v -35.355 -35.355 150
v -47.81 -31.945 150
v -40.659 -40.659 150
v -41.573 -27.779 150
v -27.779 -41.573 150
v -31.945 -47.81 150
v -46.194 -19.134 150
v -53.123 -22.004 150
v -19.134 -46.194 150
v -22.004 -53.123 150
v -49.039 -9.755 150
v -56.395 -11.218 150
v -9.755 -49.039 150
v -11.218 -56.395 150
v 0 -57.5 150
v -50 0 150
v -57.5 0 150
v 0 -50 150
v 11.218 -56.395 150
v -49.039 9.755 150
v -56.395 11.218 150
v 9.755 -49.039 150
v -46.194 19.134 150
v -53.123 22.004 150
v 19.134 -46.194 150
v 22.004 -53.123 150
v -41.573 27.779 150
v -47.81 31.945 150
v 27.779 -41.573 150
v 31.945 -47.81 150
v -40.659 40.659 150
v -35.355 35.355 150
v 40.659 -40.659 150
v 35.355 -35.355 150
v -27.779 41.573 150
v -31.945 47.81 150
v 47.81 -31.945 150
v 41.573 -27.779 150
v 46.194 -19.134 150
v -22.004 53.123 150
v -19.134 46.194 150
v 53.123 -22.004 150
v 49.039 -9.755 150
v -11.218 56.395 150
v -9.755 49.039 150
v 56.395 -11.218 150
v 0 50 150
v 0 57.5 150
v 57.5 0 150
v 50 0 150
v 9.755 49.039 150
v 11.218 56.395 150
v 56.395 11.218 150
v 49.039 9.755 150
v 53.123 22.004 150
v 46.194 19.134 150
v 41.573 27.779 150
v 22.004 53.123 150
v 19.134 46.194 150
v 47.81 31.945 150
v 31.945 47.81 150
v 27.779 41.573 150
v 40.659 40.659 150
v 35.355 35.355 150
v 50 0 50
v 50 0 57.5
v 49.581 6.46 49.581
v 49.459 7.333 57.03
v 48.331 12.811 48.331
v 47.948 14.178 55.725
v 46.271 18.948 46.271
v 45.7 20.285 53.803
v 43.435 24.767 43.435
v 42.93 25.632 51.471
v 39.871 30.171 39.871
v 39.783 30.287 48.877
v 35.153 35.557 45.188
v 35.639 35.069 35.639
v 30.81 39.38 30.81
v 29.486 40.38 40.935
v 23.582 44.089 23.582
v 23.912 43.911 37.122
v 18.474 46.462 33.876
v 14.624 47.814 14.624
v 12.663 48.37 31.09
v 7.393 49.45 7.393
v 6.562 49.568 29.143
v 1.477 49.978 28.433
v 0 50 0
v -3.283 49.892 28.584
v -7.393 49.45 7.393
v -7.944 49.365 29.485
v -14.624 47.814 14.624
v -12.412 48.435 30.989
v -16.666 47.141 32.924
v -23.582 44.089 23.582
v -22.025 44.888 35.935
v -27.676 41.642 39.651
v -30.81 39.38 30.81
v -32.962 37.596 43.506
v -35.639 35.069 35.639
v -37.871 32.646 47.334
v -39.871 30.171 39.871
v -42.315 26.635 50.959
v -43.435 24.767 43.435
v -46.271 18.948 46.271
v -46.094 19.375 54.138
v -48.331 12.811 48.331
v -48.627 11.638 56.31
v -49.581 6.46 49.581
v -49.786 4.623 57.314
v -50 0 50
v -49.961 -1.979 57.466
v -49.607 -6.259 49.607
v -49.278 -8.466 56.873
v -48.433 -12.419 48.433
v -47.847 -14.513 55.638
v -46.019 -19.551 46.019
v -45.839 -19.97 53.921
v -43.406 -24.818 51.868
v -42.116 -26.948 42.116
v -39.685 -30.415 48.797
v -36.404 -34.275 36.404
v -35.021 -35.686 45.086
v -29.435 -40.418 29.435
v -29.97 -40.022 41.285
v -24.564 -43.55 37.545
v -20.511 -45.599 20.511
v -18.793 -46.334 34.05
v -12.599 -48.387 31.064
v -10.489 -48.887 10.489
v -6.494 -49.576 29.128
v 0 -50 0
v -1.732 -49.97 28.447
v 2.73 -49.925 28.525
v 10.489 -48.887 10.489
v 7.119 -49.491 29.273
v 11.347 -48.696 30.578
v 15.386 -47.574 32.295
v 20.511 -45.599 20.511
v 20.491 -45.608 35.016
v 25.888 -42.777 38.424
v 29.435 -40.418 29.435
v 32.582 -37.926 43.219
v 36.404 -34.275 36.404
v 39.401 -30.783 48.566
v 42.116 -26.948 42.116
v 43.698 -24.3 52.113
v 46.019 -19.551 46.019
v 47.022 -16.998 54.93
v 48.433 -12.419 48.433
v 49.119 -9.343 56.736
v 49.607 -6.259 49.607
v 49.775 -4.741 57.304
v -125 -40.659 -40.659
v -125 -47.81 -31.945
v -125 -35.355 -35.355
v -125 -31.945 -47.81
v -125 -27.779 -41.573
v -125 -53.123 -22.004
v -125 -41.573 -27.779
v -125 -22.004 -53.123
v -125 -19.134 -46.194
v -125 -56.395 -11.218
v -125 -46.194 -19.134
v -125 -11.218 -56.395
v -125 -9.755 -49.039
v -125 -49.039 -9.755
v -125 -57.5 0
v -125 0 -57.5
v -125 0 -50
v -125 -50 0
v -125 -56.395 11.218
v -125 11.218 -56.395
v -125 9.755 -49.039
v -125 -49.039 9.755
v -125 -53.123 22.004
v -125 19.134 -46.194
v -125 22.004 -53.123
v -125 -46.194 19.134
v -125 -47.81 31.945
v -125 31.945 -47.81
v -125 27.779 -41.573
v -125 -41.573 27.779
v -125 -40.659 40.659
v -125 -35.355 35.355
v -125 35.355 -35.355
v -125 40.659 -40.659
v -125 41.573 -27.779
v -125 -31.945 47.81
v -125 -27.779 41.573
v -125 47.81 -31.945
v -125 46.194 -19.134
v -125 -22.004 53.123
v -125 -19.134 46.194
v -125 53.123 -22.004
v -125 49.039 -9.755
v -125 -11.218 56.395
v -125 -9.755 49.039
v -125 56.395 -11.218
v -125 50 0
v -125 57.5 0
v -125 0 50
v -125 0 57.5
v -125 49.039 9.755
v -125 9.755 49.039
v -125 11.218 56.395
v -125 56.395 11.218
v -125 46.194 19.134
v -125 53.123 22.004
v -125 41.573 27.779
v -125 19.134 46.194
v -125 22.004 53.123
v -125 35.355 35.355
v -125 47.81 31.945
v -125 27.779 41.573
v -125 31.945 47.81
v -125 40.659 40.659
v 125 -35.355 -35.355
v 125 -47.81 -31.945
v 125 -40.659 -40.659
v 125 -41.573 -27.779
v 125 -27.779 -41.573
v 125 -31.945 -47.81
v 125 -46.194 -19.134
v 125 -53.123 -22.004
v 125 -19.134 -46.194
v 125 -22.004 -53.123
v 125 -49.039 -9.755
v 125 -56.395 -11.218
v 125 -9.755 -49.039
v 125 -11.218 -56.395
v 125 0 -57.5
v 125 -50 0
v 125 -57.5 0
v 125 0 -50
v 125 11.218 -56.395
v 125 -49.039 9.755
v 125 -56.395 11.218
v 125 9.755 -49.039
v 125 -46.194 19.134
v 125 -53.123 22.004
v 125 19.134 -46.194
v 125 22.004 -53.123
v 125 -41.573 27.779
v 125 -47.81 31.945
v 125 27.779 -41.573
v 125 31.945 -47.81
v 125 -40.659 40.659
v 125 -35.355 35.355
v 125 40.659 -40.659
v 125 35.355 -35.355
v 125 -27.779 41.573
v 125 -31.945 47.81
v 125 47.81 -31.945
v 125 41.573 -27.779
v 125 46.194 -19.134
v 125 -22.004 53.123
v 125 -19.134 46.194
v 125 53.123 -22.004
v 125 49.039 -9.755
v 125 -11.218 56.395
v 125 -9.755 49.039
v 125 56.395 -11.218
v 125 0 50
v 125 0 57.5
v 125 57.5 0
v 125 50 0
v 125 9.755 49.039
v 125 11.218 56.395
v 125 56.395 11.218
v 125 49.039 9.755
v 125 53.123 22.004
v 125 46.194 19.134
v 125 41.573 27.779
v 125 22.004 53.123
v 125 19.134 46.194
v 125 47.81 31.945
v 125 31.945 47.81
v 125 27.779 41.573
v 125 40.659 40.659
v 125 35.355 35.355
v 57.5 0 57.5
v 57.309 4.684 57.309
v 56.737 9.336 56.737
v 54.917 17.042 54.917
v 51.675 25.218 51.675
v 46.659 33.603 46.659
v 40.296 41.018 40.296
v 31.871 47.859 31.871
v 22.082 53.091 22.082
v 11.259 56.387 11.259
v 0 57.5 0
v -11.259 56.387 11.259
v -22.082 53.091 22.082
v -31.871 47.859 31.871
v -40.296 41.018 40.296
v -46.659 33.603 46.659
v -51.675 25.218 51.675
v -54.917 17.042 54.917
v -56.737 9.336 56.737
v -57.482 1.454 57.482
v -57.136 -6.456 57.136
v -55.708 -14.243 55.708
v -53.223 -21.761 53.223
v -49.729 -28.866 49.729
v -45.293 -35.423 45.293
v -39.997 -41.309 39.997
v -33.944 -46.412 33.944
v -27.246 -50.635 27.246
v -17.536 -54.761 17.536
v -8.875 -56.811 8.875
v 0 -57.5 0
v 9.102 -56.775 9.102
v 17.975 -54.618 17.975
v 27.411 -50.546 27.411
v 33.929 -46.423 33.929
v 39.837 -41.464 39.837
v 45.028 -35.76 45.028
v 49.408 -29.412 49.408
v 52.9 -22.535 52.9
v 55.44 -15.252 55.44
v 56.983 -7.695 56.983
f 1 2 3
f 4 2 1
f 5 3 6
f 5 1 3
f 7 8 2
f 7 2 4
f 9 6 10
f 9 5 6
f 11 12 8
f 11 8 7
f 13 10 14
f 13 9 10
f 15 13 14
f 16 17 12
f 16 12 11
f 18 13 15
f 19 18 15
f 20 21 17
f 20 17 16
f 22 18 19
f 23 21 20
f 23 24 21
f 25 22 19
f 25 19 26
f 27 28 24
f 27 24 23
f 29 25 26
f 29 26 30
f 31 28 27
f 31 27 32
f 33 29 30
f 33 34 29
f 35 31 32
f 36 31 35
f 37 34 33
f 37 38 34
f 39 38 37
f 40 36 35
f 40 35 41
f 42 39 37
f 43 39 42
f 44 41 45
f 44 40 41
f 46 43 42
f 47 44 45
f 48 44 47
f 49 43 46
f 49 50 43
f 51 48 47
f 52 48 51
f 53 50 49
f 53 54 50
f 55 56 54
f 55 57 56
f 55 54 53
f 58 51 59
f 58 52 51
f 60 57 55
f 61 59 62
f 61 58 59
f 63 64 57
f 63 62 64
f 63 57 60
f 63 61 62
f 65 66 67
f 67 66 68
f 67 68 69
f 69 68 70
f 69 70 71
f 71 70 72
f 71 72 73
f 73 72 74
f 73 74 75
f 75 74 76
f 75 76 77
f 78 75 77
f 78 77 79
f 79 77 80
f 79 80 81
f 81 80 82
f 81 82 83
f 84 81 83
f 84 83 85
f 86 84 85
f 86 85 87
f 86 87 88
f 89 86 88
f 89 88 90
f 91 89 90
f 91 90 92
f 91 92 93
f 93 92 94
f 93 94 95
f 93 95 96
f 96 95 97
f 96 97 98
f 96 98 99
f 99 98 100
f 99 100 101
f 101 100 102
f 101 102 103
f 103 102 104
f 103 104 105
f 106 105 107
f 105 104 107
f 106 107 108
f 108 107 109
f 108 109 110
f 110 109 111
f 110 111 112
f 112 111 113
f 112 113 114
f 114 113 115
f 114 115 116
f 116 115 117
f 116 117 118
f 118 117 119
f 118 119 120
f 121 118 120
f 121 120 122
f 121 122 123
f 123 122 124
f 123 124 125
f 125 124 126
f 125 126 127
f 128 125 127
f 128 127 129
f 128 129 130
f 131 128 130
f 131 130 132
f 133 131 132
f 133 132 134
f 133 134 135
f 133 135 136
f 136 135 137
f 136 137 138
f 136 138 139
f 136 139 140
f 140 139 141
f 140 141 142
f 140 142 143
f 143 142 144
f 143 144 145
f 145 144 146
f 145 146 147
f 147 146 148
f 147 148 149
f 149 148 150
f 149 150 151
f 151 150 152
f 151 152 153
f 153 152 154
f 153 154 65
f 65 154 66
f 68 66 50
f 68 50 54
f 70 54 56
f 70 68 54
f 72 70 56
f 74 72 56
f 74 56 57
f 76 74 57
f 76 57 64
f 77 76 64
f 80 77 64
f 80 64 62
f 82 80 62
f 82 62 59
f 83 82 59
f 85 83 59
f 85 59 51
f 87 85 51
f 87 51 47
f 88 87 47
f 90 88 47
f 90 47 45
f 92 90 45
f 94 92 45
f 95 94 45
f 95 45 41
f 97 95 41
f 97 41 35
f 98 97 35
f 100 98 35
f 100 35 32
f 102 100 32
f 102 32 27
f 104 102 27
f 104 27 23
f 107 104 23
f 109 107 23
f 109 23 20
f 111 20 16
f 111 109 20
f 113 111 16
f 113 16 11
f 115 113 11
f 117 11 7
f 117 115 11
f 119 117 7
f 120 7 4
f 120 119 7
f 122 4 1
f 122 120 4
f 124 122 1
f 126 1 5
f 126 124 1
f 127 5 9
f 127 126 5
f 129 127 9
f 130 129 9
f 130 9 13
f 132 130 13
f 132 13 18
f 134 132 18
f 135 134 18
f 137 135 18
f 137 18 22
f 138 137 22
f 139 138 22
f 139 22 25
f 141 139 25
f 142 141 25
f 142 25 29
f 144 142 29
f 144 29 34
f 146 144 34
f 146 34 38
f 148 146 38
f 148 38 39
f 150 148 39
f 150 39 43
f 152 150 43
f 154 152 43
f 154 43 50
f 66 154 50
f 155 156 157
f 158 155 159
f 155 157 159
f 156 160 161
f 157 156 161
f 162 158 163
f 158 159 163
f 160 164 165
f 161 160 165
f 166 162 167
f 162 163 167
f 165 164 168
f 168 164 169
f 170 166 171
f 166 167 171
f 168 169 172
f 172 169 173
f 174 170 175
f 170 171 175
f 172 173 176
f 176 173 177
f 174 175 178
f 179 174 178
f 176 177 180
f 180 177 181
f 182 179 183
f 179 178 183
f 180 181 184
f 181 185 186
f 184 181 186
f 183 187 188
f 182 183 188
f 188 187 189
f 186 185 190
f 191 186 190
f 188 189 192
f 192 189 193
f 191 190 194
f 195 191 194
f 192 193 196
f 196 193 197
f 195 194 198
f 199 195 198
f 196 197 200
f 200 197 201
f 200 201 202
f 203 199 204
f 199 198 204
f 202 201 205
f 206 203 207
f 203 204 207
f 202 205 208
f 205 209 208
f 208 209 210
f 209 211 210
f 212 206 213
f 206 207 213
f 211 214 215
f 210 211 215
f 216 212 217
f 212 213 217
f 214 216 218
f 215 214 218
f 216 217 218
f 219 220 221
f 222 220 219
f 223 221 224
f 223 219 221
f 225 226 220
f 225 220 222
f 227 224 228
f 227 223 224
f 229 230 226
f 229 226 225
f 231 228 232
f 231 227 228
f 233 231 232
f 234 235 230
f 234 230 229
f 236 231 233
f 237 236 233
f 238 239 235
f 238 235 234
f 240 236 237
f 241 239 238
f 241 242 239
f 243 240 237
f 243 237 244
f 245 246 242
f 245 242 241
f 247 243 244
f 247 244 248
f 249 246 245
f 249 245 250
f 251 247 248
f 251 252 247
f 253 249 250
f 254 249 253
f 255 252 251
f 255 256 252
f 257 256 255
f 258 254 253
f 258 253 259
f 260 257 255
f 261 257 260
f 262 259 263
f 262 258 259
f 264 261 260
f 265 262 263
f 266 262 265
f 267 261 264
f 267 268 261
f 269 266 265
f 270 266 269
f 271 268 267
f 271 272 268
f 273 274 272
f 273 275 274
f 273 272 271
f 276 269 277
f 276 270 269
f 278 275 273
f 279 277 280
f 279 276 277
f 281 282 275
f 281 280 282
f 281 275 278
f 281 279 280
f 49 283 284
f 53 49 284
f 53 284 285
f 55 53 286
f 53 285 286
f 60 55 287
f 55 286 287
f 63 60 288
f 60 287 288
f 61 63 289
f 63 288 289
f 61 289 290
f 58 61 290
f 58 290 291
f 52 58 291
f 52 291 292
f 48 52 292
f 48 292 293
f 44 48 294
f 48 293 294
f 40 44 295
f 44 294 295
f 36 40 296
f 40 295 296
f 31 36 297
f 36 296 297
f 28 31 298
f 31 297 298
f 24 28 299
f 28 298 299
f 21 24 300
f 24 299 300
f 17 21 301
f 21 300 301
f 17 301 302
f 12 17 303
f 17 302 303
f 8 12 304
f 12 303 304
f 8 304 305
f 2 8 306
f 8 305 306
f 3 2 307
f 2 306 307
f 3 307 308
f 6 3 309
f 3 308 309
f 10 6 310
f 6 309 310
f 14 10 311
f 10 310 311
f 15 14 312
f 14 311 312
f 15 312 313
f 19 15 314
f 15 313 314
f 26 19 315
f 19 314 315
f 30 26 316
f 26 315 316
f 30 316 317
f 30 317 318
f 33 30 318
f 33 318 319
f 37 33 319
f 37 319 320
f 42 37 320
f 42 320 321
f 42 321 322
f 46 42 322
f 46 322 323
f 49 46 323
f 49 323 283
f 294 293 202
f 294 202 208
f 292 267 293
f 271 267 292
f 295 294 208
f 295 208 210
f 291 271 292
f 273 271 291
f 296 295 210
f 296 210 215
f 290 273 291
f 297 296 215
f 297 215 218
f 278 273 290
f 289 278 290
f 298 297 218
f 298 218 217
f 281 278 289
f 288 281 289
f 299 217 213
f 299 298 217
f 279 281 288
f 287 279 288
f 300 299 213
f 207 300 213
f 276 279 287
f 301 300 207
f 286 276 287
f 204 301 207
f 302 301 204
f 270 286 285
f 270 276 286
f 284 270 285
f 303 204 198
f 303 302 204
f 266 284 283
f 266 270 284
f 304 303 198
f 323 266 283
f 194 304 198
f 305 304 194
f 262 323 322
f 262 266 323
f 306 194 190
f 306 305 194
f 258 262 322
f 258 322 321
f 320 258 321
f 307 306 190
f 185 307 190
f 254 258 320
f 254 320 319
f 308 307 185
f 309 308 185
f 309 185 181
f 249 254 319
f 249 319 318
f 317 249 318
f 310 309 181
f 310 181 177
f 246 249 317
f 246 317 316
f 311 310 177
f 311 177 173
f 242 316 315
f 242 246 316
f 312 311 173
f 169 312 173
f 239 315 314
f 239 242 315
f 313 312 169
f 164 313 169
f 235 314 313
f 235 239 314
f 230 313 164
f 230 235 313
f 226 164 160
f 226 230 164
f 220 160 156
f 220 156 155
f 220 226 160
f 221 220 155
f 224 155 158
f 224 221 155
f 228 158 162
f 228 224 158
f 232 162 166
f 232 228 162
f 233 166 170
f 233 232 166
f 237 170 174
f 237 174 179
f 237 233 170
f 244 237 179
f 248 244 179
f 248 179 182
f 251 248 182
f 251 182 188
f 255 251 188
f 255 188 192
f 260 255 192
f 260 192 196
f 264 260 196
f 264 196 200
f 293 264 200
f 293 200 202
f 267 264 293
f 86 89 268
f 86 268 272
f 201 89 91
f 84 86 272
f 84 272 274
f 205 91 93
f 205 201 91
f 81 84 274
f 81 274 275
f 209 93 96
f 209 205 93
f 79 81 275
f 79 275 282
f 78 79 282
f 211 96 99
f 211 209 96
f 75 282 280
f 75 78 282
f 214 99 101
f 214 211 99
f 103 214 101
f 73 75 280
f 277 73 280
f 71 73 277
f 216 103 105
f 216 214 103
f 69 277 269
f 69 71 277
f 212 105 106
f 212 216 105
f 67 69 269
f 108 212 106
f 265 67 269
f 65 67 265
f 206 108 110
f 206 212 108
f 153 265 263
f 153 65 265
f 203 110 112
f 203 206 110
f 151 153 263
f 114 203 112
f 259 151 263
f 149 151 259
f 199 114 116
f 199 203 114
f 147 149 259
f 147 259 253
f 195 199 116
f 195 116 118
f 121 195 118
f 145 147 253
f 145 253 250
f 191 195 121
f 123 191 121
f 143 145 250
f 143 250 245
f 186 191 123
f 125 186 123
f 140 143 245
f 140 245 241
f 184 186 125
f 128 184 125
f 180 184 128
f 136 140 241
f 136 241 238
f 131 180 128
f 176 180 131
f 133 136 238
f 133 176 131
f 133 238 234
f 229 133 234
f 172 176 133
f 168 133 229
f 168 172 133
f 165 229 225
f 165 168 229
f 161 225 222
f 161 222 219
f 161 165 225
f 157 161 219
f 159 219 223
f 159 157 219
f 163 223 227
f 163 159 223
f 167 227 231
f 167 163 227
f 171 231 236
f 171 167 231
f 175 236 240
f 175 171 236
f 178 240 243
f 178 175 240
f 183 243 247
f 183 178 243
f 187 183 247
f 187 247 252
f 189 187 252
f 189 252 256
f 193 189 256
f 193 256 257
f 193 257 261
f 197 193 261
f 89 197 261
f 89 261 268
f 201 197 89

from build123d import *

# Parameters (mm, degrees)
F0_R     = 57.5
F0_R_2   = 50
F1_DEPTH = 125
F2_R     = 57.5
F2_R_2   = 50
F3_DEPTH = 150
F4_R     = 50
F5_DEPTH = 250
F6_R     = 50
F7_DEPTH = 150


with BuildPart() as f1:
    # F0 (on Right) → F1 (new body, symmetric)
    with BuildSketch(Plane.YZ):
        Circle(F0_R)
        Circle(F0_R_2, mode=Mode.SUBTRACT)
    extrude(amount=F1_DEPTH, both=True)

    # F2 (on Top) → F3 (join)
    with BuildSketch(Plane.XY):
        Circle(F2_R)
        Circle(F2_R_2, mode=Mode.SUBTRACT)
    extrude(amount=F3_DEPTH)

    # F4 (on face) → F5 (cut)
    with BuildSketch(Plane(origin=(-125, 0, 0), x_dir=(0, -1, 0), z_dir=(-1, 0, 0))):
        Circle(F4_R)
    extrude(amount=-F5_DEPTH, mode=Mode.SUBTRACT)

    # F6 (on face) → F7 (cut)
    with BuildSketch(Plane.XY.offset(150)):
        Circle(F6_R)
    extrude(amount=-F7_DEPTH, mode=Mode.SUBTRACT)


solid = f1.part
